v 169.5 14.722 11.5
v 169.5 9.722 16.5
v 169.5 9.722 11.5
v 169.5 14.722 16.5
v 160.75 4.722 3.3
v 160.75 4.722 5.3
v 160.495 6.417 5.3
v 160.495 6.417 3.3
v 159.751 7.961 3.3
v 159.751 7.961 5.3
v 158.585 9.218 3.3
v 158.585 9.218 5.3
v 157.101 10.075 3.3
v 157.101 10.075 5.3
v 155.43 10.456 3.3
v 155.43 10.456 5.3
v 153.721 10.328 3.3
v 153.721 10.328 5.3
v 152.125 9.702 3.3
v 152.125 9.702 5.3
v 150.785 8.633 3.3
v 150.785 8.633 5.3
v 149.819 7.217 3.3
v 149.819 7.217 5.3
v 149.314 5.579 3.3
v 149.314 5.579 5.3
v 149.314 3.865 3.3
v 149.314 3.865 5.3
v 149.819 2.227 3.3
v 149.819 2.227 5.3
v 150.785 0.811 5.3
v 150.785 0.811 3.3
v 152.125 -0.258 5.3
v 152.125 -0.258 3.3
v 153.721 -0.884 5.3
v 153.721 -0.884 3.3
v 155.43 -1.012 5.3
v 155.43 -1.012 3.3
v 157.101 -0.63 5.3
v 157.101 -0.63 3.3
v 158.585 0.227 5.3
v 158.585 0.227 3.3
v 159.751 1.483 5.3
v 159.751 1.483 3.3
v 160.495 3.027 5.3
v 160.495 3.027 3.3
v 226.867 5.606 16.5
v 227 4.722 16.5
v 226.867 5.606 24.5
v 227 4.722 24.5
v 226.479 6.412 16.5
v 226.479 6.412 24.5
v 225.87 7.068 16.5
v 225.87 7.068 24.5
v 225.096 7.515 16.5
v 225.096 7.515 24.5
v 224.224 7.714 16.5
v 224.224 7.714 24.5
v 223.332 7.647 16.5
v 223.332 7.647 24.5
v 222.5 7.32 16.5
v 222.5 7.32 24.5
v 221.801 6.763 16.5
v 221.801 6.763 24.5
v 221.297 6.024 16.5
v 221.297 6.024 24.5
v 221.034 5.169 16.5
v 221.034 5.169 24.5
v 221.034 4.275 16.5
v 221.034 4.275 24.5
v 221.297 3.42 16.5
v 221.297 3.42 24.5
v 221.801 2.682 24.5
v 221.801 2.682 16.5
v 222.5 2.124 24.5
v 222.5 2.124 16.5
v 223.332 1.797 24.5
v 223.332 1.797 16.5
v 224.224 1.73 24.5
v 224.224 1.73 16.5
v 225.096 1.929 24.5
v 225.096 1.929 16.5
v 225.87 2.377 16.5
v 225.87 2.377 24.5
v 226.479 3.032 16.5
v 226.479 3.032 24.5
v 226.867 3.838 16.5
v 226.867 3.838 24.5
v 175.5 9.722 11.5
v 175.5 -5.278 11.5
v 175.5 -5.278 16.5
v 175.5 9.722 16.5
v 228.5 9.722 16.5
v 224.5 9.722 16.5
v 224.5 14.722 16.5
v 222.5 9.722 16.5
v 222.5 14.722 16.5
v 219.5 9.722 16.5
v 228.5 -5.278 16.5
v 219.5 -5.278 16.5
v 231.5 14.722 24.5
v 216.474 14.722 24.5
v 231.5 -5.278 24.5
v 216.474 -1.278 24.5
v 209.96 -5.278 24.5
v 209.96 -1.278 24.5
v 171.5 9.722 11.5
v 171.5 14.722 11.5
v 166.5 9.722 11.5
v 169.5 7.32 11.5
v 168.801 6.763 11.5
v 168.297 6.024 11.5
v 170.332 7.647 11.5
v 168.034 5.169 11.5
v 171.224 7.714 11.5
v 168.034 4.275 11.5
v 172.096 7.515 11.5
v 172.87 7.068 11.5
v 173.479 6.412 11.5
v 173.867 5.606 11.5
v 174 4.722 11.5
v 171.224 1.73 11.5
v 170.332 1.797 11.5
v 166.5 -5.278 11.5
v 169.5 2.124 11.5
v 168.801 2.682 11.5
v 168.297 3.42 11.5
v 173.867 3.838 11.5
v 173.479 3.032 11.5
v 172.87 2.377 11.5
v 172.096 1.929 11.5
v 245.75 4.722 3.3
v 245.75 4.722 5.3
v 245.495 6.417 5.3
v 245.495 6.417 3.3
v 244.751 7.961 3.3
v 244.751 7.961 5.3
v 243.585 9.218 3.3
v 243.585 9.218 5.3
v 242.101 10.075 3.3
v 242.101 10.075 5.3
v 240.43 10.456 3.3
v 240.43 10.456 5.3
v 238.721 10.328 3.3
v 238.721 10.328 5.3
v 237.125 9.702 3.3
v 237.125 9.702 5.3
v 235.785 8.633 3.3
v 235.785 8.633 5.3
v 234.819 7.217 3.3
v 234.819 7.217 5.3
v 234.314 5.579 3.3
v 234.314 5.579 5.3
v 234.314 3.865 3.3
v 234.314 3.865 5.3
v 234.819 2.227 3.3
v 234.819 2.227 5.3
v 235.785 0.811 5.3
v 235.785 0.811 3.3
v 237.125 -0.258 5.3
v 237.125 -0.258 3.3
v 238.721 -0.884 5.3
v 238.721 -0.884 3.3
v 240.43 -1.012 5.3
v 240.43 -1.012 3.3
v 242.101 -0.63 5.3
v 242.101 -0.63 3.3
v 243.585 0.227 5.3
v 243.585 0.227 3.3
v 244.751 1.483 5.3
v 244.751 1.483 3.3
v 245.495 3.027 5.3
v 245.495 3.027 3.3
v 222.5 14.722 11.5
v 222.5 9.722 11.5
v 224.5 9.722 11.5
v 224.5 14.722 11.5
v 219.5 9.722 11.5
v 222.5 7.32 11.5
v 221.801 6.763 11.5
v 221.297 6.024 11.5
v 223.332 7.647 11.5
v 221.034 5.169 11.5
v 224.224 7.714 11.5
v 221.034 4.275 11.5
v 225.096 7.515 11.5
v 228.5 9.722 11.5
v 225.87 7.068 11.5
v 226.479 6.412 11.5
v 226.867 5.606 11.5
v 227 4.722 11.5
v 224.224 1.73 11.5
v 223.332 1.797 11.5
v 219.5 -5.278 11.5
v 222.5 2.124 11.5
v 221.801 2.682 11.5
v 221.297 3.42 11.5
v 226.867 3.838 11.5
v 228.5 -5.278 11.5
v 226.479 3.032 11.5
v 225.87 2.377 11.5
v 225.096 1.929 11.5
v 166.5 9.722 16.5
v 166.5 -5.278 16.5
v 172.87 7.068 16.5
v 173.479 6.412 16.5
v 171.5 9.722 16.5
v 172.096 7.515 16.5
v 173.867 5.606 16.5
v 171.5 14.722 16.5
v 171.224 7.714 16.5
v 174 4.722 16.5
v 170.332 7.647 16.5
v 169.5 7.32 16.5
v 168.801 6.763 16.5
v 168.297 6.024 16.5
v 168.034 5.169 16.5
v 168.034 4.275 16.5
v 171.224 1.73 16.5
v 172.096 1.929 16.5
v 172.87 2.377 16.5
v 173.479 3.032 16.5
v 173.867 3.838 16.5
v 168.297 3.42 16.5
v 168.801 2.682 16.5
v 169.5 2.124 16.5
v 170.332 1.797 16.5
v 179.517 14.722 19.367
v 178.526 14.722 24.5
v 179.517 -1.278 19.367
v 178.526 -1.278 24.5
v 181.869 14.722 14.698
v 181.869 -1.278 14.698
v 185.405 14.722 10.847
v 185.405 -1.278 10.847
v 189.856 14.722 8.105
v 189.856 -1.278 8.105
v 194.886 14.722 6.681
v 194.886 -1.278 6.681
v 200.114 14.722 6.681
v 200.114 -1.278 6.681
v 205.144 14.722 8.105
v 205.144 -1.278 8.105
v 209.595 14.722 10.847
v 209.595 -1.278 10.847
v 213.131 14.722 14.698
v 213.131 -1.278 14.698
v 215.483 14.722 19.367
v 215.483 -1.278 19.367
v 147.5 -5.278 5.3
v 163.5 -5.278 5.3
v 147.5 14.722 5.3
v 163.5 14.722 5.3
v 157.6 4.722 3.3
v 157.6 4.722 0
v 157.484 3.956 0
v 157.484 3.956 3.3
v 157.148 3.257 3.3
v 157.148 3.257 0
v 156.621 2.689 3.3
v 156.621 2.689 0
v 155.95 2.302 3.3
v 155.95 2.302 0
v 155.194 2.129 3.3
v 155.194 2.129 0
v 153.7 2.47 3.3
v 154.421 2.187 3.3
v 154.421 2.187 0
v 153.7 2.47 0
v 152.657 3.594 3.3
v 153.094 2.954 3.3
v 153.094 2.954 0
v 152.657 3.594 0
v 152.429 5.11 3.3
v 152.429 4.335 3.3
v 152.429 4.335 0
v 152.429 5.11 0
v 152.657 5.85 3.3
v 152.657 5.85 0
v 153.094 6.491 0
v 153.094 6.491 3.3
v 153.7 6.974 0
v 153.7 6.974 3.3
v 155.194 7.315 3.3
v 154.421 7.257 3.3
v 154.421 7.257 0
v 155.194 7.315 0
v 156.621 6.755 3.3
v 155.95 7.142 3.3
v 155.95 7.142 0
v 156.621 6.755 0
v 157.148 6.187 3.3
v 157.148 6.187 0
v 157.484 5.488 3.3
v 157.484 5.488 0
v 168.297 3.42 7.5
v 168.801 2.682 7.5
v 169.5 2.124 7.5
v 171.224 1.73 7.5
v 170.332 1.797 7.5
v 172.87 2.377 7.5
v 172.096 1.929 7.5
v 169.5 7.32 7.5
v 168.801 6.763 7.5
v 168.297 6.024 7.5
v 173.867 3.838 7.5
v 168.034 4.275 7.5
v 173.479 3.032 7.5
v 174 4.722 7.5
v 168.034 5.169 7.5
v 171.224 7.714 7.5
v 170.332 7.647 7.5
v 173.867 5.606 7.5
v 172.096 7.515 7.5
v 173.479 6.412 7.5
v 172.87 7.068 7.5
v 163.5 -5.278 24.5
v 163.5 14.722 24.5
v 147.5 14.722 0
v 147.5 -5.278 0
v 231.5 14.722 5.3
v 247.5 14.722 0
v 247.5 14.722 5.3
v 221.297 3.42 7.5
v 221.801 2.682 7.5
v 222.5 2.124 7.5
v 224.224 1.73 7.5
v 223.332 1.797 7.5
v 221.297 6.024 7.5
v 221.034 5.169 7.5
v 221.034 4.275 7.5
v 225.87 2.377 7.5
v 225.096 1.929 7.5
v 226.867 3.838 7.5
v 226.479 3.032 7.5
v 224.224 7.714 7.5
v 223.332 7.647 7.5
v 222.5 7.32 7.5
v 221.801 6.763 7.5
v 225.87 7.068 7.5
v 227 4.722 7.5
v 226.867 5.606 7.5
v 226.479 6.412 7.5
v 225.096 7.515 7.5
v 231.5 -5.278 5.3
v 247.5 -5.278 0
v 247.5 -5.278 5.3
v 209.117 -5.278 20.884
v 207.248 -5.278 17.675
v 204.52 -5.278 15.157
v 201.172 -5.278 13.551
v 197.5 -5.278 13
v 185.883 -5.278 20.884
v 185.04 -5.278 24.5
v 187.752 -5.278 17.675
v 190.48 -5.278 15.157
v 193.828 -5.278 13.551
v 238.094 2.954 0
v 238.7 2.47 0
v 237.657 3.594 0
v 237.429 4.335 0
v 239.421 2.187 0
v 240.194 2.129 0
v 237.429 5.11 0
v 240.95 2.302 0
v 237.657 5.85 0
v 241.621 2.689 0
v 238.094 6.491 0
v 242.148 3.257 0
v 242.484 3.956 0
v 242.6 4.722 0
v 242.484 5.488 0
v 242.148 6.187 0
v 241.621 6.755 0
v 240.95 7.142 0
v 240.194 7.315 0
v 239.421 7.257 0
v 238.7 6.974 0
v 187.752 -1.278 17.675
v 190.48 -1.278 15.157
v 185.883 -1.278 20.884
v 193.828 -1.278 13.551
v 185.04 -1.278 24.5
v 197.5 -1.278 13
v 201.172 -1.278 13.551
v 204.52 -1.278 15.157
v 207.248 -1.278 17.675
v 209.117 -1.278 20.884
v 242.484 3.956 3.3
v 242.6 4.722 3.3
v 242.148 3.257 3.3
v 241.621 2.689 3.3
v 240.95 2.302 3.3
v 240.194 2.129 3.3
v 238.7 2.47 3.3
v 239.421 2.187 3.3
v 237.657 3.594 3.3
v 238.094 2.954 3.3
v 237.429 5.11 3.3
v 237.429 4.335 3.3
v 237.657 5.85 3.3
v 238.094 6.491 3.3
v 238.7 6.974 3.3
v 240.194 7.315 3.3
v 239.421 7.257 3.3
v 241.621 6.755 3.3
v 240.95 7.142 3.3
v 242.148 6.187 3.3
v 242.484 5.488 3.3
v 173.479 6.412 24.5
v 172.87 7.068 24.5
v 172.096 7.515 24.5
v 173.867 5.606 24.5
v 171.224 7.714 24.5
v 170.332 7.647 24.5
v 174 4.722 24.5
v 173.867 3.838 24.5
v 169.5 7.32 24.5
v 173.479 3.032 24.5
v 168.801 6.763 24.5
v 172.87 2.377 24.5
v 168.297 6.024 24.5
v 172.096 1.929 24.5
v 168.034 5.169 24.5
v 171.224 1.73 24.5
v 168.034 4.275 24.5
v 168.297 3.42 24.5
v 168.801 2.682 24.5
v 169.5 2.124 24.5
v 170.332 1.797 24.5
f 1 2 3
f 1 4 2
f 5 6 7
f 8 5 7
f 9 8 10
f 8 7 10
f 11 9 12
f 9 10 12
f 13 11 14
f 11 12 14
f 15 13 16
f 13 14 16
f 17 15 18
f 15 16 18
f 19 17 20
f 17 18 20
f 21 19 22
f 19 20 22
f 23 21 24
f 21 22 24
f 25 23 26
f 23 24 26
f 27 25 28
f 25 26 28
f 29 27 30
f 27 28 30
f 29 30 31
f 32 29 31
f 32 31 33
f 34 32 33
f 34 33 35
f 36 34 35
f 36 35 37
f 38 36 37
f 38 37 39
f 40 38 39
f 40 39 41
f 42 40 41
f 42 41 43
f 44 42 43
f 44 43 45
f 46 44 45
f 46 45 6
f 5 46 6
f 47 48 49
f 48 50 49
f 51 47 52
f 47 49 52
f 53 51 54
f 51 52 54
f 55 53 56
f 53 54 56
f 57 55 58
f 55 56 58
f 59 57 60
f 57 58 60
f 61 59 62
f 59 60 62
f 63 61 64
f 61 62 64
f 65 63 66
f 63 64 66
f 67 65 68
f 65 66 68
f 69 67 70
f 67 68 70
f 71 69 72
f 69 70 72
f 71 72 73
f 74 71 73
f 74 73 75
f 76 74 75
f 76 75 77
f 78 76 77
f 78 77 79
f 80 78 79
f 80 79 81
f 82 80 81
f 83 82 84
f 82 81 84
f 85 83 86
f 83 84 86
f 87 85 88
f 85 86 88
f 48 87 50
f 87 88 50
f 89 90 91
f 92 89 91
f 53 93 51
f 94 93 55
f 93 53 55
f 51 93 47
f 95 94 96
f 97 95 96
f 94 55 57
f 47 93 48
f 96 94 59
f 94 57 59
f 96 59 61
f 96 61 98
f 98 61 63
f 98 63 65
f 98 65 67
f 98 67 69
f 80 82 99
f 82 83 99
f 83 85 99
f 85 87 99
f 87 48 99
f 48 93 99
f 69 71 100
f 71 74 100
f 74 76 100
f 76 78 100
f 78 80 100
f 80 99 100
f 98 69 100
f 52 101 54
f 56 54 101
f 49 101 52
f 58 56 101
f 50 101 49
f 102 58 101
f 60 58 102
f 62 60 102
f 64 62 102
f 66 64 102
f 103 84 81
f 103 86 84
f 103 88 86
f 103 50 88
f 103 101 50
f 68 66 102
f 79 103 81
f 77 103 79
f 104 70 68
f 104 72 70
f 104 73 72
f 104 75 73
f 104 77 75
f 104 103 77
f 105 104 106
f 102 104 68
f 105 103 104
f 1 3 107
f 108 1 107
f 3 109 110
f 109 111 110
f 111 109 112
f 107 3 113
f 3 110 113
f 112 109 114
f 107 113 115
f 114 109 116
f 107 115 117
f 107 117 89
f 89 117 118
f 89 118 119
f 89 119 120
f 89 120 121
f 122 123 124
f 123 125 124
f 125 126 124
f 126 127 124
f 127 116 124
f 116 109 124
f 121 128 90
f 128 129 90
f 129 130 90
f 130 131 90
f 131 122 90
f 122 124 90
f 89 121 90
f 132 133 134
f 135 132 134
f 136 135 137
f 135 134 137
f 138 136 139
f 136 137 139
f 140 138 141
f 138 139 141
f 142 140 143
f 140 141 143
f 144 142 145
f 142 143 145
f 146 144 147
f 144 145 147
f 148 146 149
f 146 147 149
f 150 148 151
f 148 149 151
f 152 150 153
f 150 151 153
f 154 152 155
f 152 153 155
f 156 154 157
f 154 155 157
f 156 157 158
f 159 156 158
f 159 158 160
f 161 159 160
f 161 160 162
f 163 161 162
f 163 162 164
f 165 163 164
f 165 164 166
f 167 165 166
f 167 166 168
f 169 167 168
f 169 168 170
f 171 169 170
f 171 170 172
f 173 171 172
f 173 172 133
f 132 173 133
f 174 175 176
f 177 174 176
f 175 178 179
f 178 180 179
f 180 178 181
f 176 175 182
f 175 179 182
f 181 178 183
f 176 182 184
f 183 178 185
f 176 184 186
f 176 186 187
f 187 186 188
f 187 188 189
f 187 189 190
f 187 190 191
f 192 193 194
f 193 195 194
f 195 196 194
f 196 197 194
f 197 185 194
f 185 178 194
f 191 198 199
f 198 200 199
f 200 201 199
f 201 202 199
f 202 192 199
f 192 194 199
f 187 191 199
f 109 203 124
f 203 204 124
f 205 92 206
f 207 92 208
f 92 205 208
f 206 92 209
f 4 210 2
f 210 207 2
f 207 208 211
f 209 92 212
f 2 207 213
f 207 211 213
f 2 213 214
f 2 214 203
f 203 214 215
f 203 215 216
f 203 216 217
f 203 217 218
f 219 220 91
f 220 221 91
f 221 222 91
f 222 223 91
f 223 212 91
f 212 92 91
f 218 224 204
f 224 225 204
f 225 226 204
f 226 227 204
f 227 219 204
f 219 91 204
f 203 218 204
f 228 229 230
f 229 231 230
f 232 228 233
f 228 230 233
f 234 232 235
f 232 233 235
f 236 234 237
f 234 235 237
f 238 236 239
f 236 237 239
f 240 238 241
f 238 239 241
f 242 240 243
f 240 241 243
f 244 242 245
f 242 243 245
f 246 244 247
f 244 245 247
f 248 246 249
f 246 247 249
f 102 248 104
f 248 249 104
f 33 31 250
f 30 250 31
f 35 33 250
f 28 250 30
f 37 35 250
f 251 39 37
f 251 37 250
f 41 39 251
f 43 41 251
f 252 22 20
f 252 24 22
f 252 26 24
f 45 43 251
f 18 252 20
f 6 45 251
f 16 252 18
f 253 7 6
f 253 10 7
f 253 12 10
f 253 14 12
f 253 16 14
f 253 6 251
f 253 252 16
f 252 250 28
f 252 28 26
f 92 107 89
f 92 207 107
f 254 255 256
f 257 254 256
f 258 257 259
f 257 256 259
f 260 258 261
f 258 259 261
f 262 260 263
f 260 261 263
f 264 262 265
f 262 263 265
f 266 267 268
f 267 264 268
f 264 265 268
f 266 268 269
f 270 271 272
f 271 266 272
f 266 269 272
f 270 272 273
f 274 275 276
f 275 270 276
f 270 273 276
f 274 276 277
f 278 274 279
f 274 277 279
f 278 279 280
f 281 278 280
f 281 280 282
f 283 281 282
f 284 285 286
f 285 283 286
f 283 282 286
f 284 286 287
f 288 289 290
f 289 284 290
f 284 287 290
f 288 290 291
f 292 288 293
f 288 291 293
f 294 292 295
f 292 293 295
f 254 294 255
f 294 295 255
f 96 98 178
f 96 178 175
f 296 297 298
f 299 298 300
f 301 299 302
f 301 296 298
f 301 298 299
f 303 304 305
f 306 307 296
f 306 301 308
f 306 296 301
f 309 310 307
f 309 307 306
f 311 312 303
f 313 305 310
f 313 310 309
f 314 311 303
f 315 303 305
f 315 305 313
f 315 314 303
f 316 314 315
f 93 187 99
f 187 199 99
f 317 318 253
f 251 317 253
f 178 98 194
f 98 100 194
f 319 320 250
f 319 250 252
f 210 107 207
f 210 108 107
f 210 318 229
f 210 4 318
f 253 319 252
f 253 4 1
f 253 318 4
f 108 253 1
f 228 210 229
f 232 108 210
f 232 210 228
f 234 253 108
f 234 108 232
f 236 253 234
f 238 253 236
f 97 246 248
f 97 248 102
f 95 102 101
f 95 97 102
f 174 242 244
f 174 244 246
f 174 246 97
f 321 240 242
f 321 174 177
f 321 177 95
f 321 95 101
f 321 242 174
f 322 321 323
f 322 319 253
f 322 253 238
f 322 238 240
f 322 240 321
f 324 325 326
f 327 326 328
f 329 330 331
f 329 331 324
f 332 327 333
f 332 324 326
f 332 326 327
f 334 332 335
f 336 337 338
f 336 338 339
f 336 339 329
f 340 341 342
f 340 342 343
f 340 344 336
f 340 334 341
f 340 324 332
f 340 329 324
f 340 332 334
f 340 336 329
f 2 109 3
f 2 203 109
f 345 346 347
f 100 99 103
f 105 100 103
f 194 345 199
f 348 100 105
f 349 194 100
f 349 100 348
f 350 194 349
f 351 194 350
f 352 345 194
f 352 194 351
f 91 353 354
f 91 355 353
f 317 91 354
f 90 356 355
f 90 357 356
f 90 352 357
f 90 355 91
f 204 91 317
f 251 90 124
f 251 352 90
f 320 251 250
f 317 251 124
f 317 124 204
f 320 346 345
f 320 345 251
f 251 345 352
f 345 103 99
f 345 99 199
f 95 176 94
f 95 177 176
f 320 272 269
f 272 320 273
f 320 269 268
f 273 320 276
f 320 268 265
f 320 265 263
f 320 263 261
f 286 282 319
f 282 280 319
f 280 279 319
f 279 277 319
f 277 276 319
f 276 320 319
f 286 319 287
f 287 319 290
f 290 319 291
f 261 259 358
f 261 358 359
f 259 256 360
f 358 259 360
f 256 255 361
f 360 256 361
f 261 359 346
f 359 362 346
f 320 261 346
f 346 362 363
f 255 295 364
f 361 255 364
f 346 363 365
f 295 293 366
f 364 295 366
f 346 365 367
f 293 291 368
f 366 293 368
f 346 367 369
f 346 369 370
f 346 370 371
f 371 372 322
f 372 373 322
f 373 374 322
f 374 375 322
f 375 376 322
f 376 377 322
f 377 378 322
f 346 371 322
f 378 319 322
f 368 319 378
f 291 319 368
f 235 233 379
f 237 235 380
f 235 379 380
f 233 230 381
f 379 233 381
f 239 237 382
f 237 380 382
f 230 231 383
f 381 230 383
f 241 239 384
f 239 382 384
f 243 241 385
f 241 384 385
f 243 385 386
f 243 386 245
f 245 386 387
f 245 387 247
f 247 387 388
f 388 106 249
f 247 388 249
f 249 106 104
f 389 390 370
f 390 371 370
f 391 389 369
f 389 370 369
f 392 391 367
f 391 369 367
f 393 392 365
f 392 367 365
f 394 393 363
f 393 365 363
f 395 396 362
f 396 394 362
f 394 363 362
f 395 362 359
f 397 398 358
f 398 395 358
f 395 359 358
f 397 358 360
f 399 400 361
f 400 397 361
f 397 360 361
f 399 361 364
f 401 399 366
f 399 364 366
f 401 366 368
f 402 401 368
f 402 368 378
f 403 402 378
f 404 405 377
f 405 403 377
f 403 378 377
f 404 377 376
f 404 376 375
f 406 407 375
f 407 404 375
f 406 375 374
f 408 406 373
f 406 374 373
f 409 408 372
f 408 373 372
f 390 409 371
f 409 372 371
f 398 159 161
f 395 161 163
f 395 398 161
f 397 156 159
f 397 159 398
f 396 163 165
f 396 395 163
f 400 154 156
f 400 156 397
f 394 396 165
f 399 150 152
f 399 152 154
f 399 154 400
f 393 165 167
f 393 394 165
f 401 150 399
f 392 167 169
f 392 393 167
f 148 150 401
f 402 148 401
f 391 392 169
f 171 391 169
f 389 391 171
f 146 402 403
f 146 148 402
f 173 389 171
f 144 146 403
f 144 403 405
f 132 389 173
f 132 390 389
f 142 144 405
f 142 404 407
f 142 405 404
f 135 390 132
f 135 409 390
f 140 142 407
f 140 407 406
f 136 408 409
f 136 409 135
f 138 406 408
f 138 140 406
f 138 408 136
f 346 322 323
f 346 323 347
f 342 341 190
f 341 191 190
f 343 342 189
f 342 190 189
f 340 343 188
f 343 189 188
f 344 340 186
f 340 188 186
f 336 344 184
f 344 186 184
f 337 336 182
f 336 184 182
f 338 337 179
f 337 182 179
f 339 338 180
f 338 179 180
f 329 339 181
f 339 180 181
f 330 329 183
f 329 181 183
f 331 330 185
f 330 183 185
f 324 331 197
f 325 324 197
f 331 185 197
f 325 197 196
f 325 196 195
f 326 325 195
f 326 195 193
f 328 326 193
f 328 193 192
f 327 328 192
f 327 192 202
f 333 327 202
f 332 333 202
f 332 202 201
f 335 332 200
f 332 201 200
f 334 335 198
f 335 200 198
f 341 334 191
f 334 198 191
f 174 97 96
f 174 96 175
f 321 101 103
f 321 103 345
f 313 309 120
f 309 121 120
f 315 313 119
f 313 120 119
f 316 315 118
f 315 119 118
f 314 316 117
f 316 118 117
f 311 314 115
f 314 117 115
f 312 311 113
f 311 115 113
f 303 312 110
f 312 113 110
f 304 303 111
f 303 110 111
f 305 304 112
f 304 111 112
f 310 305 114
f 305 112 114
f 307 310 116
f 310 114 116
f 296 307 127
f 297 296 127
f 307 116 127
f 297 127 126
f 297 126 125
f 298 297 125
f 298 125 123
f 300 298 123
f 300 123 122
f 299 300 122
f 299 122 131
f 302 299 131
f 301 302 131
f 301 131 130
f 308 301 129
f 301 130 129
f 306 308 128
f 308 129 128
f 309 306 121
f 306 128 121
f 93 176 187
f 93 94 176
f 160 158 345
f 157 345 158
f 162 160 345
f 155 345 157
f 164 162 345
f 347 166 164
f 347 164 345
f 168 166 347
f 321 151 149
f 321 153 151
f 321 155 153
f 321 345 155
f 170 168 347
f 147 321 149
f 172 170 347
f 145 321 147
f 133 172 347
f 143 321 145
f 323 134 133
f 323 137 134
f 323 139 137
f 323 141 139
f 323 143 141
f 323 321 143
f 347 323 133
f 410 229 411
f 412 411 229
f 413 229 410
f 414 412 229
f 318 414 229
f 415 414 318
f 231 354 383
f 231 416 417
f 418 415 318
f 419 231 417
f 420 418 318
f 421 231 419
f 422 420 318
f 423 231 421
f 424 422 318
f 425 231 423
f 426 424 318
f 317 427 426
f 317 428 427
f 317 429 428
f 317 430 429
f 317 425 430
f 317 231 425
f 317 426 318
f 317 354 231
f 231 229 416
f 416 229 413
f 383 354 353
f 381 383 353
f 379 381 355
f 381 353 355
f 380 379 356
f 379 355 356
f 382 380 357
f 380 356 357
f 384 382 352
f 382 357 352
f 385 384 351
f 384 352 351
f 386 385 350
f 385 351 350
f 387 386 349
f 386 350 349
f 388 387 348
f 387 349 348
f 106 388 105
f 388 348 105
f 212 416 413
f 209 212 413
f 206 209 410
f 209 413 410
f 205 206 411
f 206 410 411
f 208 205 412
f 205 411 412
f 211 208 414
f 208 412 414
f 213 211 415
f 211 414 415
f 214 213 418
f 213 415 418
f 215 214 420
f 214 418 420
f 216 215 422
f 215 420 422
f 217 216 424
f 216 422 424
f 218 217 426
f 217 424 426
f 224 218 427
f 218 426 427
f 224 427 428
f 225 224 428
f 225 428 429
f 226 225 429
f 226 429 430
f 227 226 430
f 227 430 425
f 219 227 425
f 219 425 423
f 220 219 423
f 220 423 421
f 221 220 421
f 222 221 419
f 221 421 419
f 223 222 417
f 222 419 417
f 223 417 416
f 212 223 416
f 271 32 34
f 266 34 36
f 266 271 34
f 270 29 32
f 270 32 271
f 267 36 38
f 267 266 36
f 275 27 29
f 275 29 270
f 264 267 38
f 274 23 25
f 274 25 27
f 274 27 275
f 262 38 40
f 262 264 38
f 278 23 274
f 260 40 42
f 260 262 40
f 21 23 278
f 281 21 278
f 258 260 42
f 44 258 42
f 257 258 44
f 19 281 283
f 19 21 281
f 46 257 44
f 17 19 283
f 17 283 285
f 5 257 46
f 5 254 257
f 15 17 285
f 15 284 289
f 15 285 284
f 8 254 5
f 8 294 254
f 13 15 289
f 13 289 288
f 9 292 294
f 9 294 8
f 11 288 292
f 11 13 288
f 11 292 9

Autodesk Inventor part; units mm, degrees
ref_plane "YZ Plane" through (0, 0, 0) normal (1, 0, 0) x (0, 1, 0)
ref_plane "XZ Plane" through (0, 0, 0) normal (0, 1, 0) x (-1, 0, 0)
ref_plane "XY Plane" through (0, 0, 0) normal (0, 0, 1) x (1, 0, 0)
ref_plane "Work Plane1" through (0, 0, 0) normal (0, 0, 1) x (1, 0, 0)
sketch "Sketch1" plane through (0, 0, 0) normal (0, 0, 1) x (1, 0, 0)
  line L0 (247.5, -5.2779) -> (147.5, -5.2779)
  line L1 (147.5, -5.2779) -> (147.5, 14.7221)
  line L2 (147.5, 14.7221) -> (247.5, 14.7221)
  line L3 (247.5, 14.7221) -> (247.5, -5.2779)
  line L4 (235, 40.7039) -> (235, 15.7039) projected
  line L5 (160, 15.7039) -> (160, 40.7039) projected
  line L6 (161, 181.7039) -> (234, 181.7039)
  arc A0 (235, 180.7039) -> (234, 181.7039) centre (234, 180.7039) ccw
  line L7 (235, 180.7039) -> (235, 155.7039)
  arc A1 (234, 154.7039) -> (235, 155.7039) centre (234, 155.7039) ccw
  line L8 (234, 154.7039) -> (219.9889, 154.7039)
  line L9 (219.9889, 154.7039) -> (219.9889, 41.7039)
  line L10 (219.9889, 41.7039) -> (234, 41.7039)
  arc A2 (235, 40.7039) -> (234, 41.7039) centre (234, 40.7039) ccw
  line L11 (235, 40.7039) -> (235, 15.7039)
  arc A3 (234, 14.7039) -> (235, 15.7039) centre (234, 15.7039) ccw
  line L12 (234, 14.7039) -> (229.5826, 14.7039)
  line L13 (229.5826, 14.7039) -> (229.5826, 21.7039)
  line L14 (229.5826, 21.7039) -> (220.4174, 21.7039)
  line L15 (220.4174, 21.7039) -> (220.4174, 14.7039)
  line L16 (220.4174, 14.7039) -> (174.5826, 14.7039)
  line L17 (174.5826, 14.7039) -> (174.5826, 21.7039)
  line L18 (174.5826, 21.7039) -> (165.4174, 21.7039)
  line L19 (165.4174, 21.7039) -> (165.4174, 14.7039)
  line L20 (165.4174, 14.7039) -> (161, 14.7039)
  arc A4 (160, 15.7039) -> (161, 14.7039) centre (161, 15.7039) ccw
  line L21 (160, 15.7039) -> (160, 40.7039)
  arc A5 (161, 41.7039) -> (160, 40.7039) centre (161, 40.7039) ccw
  line L22 (161, 41.7039) -> (175.0111, 41.7039)
  line L23 (175.0111, 41.7039) -> (175.0111, 154.7039)
  line L24 (175.0111, 154.7039) -> (161, 154.7039)
  arc A6 (160, 155.7039) -> (161, 154.7039) centre (161, 155.7039) ccw
  line L25 (160, 155.7039) -> (160, 180.7039)
  arc A7 (161, 181.7039) -> (160, 180.7039) centre (161, 180.7039) ccw
  line L26 (161, 181.7039) -> (234, 181.7039)
  arc A8 (235, 180.7039) -> (234, 181.7039) centre (234, 180.7039) ccw
  line L27 (235, 180.7039) -> (235, 155.7039)
  arc A9 (234, 154.7039) -> (235, 155.7039) centre (234, 155.7039) ccw
  line L28 (234, 154.7039) -> (219.9889, 154.7039)
  line L29 (219.9889, 154.7039) -> (219.9889, 41.7039)
  line L30 (219.9889, 41.7039) -> (234, 41.7039)
  arc A10 (235, 40.7039) -> (234, 41.7039) centre (234, 40.7039) ccw
  line L31 (235, 40.7039) -> (235, 15.7039)
  arc A11 (234, 14.7039) -> (235, 15.7039) centre (234, 15.7039) ccw
  line L32 (234, 14.7039) -> (229.5826, 14.7039)
  line L33 (229.5826, 14.7039) -> (229.5826, 21.7039)
  line L34 (229.5826, 21.7039) -> (220.4174, 21.7039)
  line L35 (220.4174, 21.7039) -> (220.4174, 14.7039)
  line L36 (220.4174, 14.7039) -> (174.5826, 14.7039)
  line L37 (174.5826, 14.7039) -> (174.5826, 21.7039)
  line L38 (174.5826, 21.7039) -> (165.4174, 21.7039)
  line L39 (165.4174, 21.7039) -> (165.4174, 14.7039)
  line L40 (165.4174, 14.7039) -> (161, 14.7039)
  arc A12 (160, 15.7039) -> (161, 14.7039) centre (161, 15.7039) ccw
  line L41 (160, 15.7039) -> (160, 40.7039)
  arc A13 (161, 41.7039) -> (160, 40.7039) centre (161, 40.7039) ccw
  line L42 (161, 41.7039) -> (175.0111, 41.7039)
  line L43 (175.0111, 41.7039) -> (175.0111, 154.7039)
  line L44 (175.0111, 154.7039) -> (161, 154.7039)
  arc A14 (160, 155.7039) -> (161, 154.7039) centre (161, 155.7039) ccw
  line L45 (160, 155.7039) -> (160, 180.7039)
  arc A15 (161, 181.7039) -> (160, 180.7039) centre (161, 180.7039) ccw
  line L46 (0, 0) -> (400, 0)
  line L47 (400, 0) -> (400, -5.0961)
  line L48 (0, -5.0961) -> (400, -5.0961)
  line L49 (0, -5.0961) -> (0, 0)
  line L50 (0, 14.5039) -> (400, 14.5039)
  line L51 (400, 14.5039) -> (400, 9.6864)
  line L52 (400, 9.6864) -> (0, 9.6864)
  line L53 (0, 9.6864) -> (0, 14.5039)
  circle A16 centre (240, 4.7221) radius 2.6
  circle A17 centre (155, 4.7221) radius 2.6
  point P0 (153.6248, 9.6864)
  point P1 (156.3752, 9.6864)
  point P2 (241.3752, 9.6864)
  point P3 (238.6248, 9.6864)
  dimension "d1" = 100
  dimension "d4" = -12.5
  dimension "d5" = 12.5
  dimension "d6" = 5.2
  dimension "d7" = 5.2
  dimension "d8" = 7.5
  dimension "d9" = 7.5
  dimension "d22" = 20
  dimension "d23" = 10
  dimension "d24" = 10
extrude "Extrusion1" add sketch "Sketch1" along normal blind 5.3 contours L0 L1 L48 L3 | L48 L1 L46 L3 | L46 L1 L52 L3 | L52 L1 L50 L3 | L50 L1 L2 A4 L20 L19 L17 L16 L15 L13 L12 A3 L3 | A3 L12 L13 L2 | L2 L19 L20 A4 | L15 L16 L17 L2
sketch "Sketch2" plane through (147.5, -5.2779, 0) normal (0, -1, 0) x (1, 0, 0)
  circle A0 centre (50, 25.5) radius 19
  line L0 (69, 25.5) -> (84, 25.5)
  line L1 (31, 25.5) -> (16, 25.5)
  line L2 (16, 25.5) -> (16, 5.3)
  line L3 (0, 5.3) -> (100, 5.3) projected
  line L4 (84, 25.5) -> (84, 5.3)
  line L5 (84, 24.5) -> (68.9737, 24.5)
  line L6 (31.0263, 24.5) -> (16, 24.5)
  point P0 (-147.5, 0)
  dimension "d10" = 15
  dimension "d11" = 15
  dimension "d14" = 1
extrude "Extrusion2" add sketch "Sketch2" against normal up to surface (20 mm away) contours L5 L4 L3 L2 L6 A0
sketch "Sketch3" plane through (216.4737, -5.2779, 24.5) normal (0, 0, 1) x (1, 0, 0)
  circle A0 centre (7.5263, 10) radius 3
  circle A1 centre (-45.4737, 10) radius 3
  line L0 (15.0263, 0) -> (15.0263, 20) projected
  line L1 (0, 0) -> (0, 20) projected
  line L2 (-52.9737, 0) -> (-52.9737, 20) projected
  line L3 (-37.9473, 0) -> (-52.9737, 0) projected
  line L4 (15.0263, 0) -> (0, 0) projected
  point P0 (-216.4737, 5.2779)
  point P1 (15.0263, 10)
  dimension "d15" = 6
  dimension "d16" = 6
  dimension "d17" = 7.5
  dimension "d19" = 7.5
  dimension "d25" = 10
  dimension "d26" = 10
extrude "Extrusion3" cut sketch "Sketch3" against normal blind 17
sketch "Sketch4" plane through (147.5, -5.2779, 0) normal (0, -1, 0) x (1, 0, 0)
  line L0 (84, 24.5) -> (68.9737, 24.5) projected
  line L1 (84, 24.5) -> (16, 24.5)
  line L2 (16, 24.5) -> (16, 5.3)
  line L3 (16, 5.3) -> (84, 5.3)
  line L4 (84, 5.3) -> (84, 24.5)
  arc A0 (31.0263, 24.5) -> (68.9737, 24.5) centre (50, 25.5) ccw projected
  circle A1 centre (50, 25.5) radius 12.5
  point P0 (-147.5, 0)
  point P1 (62.4599, 24.5)
  point P2 (37.5401, 24.5)
  dimension "d27" = 25
extrude "Extrusion4" add sketch "Sketch4" against normal blind 4 contours L4 L3 L2 L1 A0 L0 | A0 L1 A1
sketch "Sketch5" plane through (147.5, -5.2779, 0) normal (0, -1, 0) x (1, 0, 0)
  line L0 (81, 16.5) -> (72, 16.5)
  line L1 (72, 16.5) -> (72, 11.5)
  line L2 (72, 11.5) -> (81, 11.5)
  line L3 (81, 11.5) -> (81, 16.5)
  line L4 (73.5, 24.5) -> (79.5, 24.5) projected
  line L5 (20.5, 24.5) -> (26.5, 24.5) projected
  line L6 (20.5, 7.5) -> (26.5, 7.5) projected
  line L7 (20.5, 24.5) -> (26.5, 24.5) projected
  line L8 (73.5, 7.5) -> (79.5, 7.5) projected
  line L9 (73.5, 24.5) -> (79.5, 24.5) projected
  line L10 (28, 16.5) -> (19, 16.5)
  line L11 (19, 16.5) -> (19, 11.5)
  line L12 (19, 11.5) -> (28, 11.5)
  line L13 (28, 11.5) -> (28, 16.5)
  point P0 (-147.5, 0)
  point P1 (76.5, 24.5)
  point P2 (76.5, 16.5)
  point P3 (23.5, 24.5)
  point P4 (23.5, 16.5)
  dimension "d30" = 9
  dimension "d31" = 5
  dimension "d32" = 6
  dimension "d33" = 1.5
  dimension "d34" = 8
  dimension "d35" = 9
  dimension "d36" = 5
  dimension "d37" = 6
  dimension "d38" = 1.5
  dimension "d39" = 8
extrude "Extrusion5" cut sketch "Sketch5" against normal blind 15
sketch "Sketch6" plane through (147.5, 14.7221, 0) normal (0, 1, 0) x (1, 0, 0)
  line L0 (81, -11.5) -> (72, -11.5) projected
  line L1 (72, -11.5) -> (72, -16.5) projected
  line L2 (72, -16.5) -> (81, -16.5) projected
  line L3 (81, -16.5) -> (81, -11.5) projected
  line L4 (28, -11.5) -> (19, -11.5) projected
  line L5 (19, -11.5) -> (19, -16.5) projected
  line L6 (19, -16.5) -> (28, -16.5) projected
  line L7 (28, -16.5) -> (28, -11.5) projected
  line L8 (0, -5.3) -> (16, -5.3) projected
  line L9 (0, 0) -> (0, -5.3) projected
  line L10 (0, 0) -> (100, 0) projected
  line L11 (100, 0) -> (100, -5.3) projected
  line L12 (84, -5.3) -> (100, -5.3) projected
  line L13 (84, -5.3) -> (84, -24.5) projected
  line L14 (84, -24.5) -> (62.4599, -24.5) projected
  arc A0 (62.4599, -24.5) -> (37.5401, -24.5) centre (50, -25.5) ccw projected
  line L15 (37.5401, -24.5) -> (16, -24.5) projected
  line L16 (16, -24.5) -> (16, -5.3) projected
  line L17 (20.5, -11.5) -> (26.5, -11.5) projected
  line L18 (22, -11.5) -> (24, -11.5)
  line L19 (24, -11.5) -> (24, -16.5)
  line L20 (24, -16.5) -> (22, -16.5)
  line L21 (22, -16.5) -> (22, -11.5)
  line L22 (73.5, -11.5) -> (79.5, -11.5) projected
  line L23 (72, -16.5) -> (81, -16.5) projected
  line L24 (75, -11.5) -> (77, -11.5)
  line L25 (77, -11.5) -> (77, -16.5)
  line L26 (77, -16.5) -> (75, -16.5)
  line L27 (75, -16.5) -> (75, -11.5)
  point P0 (-147.5, 0)
  point P1 (22, -11.5)
  dimension "d42" = 2
  dimension "d43" = 9
  dimension "d44" = 3
  dimension "d45" = 2
  dimension "d46" = 3
extrude "Extrusion6" cut sketch "Sketch6" against normal through all contours L25 L2 L27 L0 | L19 L6 L21 L4
sketch "Sketch7" plane through (0, 0, 5.3) normal (0, 0, 1) x (1, 0, 0)
  circle A0 centre (240, 4.7221) radius 2.6 projected
  circle A1 centre (240, 4.7221) radius 5.75
  circle A2 centre (155, 4.7221) radius 2.6 projected
  circle A3 centre (155, 4.7221) radius 5.75
  point P0 (0, 0)
  dimension "d49" = 11.5
  dimension "d50" = 11.5
extrude "Extrusion7" cut sketch "Sketch7" against normal blind 2
equation "\"d30\" = d35"
equation "\"d31\" = d36"
equation "\"d33\" = -0.5 * d32 + 0.5 * d30"
equation "\"d34\" = d39"
equation "\"d38\" = -0.5 * d37 + 0.5 * d35"
equation "\"d49\" = d50"
properties part number "FrontPistonSupportButtom"
